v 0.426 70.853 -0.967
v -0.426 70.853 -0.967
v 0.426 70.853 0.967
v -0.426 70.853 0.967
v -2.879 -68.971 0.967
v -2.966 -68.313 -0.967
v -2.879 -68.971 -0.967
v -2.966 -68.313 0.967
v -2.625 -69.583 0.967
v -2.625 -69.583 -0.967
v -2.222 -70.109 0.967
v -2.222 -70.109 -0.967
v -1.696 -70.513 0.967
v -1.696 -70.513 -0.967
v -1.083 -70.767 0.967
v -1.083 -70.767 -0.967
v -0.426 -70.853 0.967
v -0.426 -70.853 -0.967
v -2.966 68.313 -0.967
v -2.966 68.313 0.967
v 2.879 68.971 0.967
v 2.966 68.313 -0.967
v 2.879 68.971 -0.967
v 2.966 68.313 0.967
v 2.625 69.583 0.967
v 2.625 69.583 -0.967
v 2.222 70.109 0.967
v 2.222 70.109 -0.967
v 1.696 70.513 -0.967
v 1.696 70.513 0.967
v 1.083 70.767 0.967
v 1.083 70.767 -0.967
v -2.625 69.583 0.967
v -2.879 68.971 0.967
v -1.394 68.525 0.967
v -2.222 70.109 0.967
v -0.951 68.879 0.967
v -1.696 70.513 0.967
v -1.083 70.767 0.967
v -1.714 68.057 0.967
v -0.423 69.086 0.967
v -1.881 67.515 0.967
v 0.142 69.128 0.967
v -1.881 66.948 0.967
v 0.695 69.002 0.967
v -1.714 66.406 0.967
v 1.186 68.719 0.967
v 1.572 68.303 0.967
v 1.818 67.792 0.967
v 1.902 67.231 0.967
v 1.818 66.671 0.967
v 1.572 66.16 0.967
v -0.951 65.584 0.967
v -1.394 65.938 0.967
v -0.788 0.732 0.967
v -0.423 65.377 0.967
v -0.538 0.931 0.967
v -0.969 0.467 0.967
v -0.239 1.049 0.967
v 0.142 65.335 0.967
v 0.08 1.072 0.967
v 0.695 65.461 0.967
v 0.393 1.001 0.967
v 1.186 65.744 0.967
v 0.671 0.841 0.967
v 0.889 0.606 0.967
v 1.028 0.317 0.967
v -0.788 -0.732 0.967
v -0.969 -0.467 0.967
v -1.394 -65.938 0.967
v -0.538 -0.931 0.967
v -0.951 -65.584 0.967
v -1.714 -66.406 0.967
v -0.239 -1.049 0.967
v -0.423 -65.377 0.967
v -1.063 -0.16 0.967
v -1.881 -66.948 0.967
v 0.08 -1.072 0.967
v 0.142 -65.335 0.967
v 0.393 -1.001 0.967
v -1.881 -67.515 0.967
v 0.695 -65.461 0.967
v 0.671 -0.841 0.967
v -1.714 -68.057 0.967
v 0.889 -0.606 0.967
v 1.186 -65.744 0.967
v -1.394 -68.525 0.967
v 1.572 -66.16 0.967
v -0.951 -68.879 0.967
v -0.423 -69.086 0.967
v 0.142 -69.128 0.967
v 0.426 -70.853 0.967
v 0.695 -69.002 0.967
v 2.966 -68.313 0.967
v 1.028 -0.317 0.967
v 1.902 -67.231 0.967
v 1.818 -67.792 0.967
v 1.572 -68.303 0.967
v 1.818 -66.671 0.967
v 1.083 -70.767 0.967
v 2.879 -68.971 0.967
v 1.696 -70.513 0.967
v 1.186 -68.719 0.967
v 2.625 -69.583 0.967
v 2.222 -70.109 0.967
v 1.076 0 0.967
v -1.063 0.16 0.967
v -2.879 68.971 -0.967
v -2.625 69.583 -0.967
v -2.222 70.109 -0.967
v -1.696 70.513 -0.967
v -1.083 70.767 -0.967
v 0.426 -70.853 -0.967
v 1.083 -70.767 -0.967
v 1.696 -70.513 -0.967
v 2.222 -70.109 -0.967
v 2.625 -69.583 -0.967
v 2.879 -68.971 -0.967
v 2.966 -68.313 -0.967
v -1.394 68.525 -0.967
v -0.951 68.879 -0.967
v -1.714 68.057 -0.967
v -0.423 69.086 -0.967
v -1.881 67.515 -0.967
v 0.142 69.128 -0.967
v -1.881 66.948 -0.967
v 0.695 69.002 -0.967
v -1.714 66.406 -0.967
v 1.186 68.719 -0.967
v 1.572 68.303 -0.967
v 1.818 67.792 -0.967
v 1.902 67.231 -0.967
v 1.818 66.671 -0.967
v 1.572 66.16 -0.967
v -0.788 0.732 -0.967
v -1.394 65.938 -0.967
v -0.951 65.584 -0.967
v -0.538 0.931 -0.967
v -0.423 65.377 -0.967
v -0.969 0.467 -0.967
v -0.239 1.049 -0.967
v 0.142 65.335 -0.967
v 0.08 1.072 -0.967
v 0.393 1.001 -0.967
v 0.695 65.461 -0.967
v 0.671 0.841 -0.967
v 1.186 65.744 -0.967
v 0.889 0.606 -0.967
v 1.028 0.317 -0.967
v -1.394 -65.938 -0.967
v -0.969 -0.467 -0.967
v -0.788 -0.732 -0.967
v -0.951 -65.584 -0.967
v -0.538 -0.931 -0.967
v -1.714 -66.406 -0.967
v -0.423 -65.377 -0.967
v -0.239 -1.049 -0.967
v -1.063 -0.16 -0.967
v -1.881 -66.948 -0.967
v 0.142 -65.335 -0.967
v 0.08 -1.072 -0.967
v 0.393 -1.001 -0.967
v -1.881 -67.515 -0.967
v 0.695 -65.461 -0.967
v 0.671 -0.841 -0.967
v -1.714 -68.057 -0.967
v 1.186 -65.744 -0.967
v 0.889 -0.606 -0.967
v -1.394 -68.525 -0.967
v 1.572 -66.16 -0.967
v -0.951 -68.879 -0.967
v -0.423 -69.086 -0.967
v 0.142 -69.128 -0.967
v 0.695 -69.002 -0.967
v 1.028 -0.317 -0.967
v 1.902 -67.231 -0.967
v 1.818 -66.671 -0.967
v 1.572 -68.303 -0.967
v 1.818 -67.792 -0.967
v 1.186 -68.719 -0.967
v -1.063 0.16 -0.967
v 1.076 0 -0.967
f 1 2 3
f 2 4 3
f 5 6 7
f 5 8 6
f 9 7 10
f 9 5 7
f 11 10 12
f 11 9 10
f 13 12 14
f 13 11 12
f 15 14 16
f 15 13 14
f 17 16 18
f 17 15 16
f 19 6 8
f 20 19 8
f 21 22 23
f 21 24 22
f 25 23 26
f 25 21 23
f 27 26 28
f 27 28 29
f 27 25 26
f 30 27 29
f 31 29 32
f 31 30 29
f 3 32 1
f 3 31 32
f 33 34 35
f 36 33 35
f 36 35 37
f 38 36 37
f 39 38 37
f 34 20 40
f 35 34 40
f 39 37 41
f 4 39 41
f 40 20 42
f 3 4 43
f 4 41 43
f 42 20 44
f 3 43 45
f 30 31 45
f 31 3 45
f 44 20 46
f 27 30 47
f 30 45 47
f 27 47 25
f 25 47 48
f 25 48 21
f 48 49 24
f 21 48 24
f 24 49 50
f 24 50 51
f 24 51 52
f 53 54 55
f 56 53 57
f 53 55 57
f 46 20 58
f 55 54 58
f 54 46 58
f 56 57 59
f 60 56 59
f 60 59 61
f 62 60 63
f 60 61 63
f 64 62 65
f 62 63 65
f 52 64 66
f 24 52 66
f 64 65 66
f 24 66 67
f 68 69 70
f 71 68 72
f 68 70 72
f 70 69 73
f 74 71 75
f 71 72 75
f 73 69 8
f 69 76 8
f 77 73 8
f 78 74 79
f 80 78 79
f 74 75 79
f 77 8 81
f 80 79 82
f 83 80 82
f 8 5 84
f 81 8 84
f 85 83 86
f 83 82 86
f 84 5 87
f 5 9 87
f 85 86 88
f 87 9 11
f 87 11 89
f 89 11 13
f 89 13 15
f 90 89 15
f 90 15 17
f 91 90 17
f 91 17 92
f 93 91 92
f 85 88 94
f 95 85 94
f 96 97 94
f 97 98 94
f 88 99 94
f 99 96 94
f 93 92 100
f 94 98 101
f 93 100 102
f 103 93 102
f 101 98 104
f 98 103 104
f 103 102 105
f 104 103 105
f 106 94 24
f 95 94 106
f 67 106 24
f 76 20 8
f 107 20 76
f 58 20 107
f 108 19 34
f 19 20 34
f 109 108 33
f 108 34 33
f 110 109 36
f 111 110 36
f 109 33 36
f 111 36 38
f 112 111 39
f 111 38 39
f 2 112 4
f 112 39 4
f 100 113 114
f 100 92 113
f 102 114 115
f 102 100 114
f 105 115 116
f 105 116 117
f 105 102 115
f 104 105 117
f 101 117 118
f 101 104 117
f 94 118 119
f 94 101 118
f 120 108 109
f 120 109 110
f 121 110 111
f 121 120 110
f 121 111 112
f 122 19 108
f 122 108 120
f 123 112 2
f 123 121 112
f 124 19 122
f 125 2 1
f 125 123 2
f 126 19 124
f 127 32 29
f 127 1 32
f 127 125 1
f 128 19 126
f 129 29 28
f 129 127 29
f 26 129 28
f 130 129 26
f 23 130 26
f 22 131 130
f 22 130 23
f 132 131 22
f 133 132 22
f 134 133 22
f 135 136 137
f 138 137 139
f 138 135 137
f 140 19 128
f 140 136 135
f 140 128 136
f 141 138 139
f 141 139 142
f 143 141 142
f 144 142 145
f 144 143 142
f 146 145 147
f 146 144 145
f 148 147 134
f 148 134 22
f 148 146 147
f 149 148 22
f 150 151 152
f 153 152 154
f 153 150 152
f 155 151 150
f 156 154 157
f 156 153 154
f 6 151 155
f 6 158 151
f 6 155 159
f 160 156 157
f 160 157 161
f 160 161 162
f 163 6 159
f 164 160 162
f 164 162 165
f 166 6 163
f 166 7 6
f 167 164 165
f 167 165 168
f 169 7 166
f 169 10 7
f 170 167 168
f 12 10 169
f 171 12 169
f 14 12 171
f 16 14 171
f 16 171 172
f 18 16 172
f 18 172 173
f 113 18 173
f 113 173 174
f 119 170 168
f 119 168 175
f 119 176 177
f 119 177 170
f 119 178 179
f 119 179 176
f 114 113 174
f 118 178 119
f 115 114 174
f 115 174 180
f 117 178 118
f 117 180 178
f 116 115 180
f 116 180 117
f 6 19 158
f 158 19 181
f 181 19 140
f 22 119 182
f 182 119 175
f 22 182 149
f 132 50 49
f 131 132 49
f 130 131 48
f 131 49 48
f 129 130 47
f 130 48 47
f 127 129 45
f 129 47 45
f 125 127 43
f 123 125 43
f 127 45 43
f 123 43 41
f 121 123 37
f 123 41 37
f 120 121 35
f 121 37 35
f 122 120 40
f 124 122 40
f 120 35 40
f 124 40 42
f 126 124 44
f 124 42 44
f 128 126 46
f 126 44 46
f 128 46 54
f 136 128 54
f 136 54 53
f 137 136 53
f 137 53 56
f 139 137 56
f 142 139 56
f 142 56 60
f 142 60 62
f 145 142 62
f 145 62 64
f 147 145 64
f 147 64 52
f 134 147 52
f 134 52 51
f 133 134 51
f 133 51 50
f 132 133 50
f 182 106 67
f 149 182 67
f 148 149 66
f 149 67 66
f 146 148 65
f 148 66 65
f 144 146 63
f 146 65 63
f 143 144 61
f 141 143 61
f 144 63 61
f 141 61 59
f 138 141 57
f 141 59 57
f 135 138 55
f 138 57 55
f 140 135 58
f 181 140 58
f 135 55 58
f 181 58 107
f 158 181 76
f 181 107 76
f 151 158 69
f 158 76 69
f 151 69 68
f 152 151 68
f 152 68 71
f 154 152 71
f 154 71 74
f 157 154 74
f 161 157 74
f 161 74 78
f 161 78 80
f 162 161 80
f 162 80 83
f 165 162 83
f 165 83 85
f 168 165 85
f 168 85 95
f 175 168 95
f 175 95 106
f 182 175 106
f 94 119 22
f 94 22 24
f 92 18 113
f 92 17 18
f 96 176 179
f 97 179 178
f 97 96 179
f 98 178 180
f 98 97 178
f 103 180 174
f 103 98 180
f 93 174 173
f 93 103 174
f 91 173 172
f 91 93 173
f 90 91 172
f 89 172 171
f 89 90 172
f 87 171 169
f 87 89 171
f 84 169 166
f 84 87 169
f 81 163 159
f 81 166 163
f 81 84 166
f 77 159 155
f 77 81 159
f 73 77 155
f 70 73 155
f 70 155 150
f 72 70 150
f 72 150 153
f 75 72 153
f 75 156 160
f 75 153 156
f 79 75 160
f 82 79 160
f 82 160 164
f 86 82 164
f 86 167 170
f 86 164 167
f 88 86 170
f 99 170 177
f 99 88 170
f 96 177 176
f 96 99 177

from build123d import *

# Parameters (mm, degrees)
F0_W          = 5.9313117526
F0_H          = 1.9345532637
F1_DEPTH      = 70.8533
F1_DEPTH_BACK = 70.8533
F2_R          = 2.54
F3_R          = 1.9022356475
F4_DEPTH      = 2.3622
F5_R          = 1.0755010134
F6_DEPTH      = 2.01676


# Not quite as in the source:
# - a pattern or mirror of a feature is missing from the dataset's text; its kind, count and spacing are read off the source's solid


with BuildPart() as f1:
    # F0 (on Front) → F1 (new body, two sides)
    with BuildSketch(Plane.XZ) as f1_sk:
        Rectangle(F0_W, F0_H)
    extrude(amount=F1_DEPTH)
    extrude(f1_sk.sketch, amount=-F1_DEPTH_BACK)

    # F2
    f2_edges = [f1.edges().sort_by_distance(p)[0] for p in [
        (2.965656, -70.8533, 0),
        (-2.965656, -70.8533, 0),
        (2.965656, 70.8533, 0),
        (-2.965656, 70.8533, 0),
    ]]
    fillet(f2_edges, radius=F2_R)

    # F3 (on face) → F4 (cut)
    with BuildSketch(Plane.XY.offset(0.9672766319)):
        with Locations((0, 67.2314763069)):
            Circle(F3_R)
    f4 = extrude(amount=-F4_DEPTH, mode=Mode.SUBTRACT)

    # F4_copies: F4 across plane
    add(f4.mirror(Plane(origin=(0, 0, 0), x_dir=(0, 0, -1), z_dir=(0, -1, 0))), mode=Mode.SUBTRACT)

    # F5 (on face) → F6 (cut)
    with BuildSketch(Plane.XY.offset(0.9672766319)):
        Circle(F5_R)
    extrude(amount=-F6_DEPTH, mode=Mode.SUBTRACT)


solid = f1.part
